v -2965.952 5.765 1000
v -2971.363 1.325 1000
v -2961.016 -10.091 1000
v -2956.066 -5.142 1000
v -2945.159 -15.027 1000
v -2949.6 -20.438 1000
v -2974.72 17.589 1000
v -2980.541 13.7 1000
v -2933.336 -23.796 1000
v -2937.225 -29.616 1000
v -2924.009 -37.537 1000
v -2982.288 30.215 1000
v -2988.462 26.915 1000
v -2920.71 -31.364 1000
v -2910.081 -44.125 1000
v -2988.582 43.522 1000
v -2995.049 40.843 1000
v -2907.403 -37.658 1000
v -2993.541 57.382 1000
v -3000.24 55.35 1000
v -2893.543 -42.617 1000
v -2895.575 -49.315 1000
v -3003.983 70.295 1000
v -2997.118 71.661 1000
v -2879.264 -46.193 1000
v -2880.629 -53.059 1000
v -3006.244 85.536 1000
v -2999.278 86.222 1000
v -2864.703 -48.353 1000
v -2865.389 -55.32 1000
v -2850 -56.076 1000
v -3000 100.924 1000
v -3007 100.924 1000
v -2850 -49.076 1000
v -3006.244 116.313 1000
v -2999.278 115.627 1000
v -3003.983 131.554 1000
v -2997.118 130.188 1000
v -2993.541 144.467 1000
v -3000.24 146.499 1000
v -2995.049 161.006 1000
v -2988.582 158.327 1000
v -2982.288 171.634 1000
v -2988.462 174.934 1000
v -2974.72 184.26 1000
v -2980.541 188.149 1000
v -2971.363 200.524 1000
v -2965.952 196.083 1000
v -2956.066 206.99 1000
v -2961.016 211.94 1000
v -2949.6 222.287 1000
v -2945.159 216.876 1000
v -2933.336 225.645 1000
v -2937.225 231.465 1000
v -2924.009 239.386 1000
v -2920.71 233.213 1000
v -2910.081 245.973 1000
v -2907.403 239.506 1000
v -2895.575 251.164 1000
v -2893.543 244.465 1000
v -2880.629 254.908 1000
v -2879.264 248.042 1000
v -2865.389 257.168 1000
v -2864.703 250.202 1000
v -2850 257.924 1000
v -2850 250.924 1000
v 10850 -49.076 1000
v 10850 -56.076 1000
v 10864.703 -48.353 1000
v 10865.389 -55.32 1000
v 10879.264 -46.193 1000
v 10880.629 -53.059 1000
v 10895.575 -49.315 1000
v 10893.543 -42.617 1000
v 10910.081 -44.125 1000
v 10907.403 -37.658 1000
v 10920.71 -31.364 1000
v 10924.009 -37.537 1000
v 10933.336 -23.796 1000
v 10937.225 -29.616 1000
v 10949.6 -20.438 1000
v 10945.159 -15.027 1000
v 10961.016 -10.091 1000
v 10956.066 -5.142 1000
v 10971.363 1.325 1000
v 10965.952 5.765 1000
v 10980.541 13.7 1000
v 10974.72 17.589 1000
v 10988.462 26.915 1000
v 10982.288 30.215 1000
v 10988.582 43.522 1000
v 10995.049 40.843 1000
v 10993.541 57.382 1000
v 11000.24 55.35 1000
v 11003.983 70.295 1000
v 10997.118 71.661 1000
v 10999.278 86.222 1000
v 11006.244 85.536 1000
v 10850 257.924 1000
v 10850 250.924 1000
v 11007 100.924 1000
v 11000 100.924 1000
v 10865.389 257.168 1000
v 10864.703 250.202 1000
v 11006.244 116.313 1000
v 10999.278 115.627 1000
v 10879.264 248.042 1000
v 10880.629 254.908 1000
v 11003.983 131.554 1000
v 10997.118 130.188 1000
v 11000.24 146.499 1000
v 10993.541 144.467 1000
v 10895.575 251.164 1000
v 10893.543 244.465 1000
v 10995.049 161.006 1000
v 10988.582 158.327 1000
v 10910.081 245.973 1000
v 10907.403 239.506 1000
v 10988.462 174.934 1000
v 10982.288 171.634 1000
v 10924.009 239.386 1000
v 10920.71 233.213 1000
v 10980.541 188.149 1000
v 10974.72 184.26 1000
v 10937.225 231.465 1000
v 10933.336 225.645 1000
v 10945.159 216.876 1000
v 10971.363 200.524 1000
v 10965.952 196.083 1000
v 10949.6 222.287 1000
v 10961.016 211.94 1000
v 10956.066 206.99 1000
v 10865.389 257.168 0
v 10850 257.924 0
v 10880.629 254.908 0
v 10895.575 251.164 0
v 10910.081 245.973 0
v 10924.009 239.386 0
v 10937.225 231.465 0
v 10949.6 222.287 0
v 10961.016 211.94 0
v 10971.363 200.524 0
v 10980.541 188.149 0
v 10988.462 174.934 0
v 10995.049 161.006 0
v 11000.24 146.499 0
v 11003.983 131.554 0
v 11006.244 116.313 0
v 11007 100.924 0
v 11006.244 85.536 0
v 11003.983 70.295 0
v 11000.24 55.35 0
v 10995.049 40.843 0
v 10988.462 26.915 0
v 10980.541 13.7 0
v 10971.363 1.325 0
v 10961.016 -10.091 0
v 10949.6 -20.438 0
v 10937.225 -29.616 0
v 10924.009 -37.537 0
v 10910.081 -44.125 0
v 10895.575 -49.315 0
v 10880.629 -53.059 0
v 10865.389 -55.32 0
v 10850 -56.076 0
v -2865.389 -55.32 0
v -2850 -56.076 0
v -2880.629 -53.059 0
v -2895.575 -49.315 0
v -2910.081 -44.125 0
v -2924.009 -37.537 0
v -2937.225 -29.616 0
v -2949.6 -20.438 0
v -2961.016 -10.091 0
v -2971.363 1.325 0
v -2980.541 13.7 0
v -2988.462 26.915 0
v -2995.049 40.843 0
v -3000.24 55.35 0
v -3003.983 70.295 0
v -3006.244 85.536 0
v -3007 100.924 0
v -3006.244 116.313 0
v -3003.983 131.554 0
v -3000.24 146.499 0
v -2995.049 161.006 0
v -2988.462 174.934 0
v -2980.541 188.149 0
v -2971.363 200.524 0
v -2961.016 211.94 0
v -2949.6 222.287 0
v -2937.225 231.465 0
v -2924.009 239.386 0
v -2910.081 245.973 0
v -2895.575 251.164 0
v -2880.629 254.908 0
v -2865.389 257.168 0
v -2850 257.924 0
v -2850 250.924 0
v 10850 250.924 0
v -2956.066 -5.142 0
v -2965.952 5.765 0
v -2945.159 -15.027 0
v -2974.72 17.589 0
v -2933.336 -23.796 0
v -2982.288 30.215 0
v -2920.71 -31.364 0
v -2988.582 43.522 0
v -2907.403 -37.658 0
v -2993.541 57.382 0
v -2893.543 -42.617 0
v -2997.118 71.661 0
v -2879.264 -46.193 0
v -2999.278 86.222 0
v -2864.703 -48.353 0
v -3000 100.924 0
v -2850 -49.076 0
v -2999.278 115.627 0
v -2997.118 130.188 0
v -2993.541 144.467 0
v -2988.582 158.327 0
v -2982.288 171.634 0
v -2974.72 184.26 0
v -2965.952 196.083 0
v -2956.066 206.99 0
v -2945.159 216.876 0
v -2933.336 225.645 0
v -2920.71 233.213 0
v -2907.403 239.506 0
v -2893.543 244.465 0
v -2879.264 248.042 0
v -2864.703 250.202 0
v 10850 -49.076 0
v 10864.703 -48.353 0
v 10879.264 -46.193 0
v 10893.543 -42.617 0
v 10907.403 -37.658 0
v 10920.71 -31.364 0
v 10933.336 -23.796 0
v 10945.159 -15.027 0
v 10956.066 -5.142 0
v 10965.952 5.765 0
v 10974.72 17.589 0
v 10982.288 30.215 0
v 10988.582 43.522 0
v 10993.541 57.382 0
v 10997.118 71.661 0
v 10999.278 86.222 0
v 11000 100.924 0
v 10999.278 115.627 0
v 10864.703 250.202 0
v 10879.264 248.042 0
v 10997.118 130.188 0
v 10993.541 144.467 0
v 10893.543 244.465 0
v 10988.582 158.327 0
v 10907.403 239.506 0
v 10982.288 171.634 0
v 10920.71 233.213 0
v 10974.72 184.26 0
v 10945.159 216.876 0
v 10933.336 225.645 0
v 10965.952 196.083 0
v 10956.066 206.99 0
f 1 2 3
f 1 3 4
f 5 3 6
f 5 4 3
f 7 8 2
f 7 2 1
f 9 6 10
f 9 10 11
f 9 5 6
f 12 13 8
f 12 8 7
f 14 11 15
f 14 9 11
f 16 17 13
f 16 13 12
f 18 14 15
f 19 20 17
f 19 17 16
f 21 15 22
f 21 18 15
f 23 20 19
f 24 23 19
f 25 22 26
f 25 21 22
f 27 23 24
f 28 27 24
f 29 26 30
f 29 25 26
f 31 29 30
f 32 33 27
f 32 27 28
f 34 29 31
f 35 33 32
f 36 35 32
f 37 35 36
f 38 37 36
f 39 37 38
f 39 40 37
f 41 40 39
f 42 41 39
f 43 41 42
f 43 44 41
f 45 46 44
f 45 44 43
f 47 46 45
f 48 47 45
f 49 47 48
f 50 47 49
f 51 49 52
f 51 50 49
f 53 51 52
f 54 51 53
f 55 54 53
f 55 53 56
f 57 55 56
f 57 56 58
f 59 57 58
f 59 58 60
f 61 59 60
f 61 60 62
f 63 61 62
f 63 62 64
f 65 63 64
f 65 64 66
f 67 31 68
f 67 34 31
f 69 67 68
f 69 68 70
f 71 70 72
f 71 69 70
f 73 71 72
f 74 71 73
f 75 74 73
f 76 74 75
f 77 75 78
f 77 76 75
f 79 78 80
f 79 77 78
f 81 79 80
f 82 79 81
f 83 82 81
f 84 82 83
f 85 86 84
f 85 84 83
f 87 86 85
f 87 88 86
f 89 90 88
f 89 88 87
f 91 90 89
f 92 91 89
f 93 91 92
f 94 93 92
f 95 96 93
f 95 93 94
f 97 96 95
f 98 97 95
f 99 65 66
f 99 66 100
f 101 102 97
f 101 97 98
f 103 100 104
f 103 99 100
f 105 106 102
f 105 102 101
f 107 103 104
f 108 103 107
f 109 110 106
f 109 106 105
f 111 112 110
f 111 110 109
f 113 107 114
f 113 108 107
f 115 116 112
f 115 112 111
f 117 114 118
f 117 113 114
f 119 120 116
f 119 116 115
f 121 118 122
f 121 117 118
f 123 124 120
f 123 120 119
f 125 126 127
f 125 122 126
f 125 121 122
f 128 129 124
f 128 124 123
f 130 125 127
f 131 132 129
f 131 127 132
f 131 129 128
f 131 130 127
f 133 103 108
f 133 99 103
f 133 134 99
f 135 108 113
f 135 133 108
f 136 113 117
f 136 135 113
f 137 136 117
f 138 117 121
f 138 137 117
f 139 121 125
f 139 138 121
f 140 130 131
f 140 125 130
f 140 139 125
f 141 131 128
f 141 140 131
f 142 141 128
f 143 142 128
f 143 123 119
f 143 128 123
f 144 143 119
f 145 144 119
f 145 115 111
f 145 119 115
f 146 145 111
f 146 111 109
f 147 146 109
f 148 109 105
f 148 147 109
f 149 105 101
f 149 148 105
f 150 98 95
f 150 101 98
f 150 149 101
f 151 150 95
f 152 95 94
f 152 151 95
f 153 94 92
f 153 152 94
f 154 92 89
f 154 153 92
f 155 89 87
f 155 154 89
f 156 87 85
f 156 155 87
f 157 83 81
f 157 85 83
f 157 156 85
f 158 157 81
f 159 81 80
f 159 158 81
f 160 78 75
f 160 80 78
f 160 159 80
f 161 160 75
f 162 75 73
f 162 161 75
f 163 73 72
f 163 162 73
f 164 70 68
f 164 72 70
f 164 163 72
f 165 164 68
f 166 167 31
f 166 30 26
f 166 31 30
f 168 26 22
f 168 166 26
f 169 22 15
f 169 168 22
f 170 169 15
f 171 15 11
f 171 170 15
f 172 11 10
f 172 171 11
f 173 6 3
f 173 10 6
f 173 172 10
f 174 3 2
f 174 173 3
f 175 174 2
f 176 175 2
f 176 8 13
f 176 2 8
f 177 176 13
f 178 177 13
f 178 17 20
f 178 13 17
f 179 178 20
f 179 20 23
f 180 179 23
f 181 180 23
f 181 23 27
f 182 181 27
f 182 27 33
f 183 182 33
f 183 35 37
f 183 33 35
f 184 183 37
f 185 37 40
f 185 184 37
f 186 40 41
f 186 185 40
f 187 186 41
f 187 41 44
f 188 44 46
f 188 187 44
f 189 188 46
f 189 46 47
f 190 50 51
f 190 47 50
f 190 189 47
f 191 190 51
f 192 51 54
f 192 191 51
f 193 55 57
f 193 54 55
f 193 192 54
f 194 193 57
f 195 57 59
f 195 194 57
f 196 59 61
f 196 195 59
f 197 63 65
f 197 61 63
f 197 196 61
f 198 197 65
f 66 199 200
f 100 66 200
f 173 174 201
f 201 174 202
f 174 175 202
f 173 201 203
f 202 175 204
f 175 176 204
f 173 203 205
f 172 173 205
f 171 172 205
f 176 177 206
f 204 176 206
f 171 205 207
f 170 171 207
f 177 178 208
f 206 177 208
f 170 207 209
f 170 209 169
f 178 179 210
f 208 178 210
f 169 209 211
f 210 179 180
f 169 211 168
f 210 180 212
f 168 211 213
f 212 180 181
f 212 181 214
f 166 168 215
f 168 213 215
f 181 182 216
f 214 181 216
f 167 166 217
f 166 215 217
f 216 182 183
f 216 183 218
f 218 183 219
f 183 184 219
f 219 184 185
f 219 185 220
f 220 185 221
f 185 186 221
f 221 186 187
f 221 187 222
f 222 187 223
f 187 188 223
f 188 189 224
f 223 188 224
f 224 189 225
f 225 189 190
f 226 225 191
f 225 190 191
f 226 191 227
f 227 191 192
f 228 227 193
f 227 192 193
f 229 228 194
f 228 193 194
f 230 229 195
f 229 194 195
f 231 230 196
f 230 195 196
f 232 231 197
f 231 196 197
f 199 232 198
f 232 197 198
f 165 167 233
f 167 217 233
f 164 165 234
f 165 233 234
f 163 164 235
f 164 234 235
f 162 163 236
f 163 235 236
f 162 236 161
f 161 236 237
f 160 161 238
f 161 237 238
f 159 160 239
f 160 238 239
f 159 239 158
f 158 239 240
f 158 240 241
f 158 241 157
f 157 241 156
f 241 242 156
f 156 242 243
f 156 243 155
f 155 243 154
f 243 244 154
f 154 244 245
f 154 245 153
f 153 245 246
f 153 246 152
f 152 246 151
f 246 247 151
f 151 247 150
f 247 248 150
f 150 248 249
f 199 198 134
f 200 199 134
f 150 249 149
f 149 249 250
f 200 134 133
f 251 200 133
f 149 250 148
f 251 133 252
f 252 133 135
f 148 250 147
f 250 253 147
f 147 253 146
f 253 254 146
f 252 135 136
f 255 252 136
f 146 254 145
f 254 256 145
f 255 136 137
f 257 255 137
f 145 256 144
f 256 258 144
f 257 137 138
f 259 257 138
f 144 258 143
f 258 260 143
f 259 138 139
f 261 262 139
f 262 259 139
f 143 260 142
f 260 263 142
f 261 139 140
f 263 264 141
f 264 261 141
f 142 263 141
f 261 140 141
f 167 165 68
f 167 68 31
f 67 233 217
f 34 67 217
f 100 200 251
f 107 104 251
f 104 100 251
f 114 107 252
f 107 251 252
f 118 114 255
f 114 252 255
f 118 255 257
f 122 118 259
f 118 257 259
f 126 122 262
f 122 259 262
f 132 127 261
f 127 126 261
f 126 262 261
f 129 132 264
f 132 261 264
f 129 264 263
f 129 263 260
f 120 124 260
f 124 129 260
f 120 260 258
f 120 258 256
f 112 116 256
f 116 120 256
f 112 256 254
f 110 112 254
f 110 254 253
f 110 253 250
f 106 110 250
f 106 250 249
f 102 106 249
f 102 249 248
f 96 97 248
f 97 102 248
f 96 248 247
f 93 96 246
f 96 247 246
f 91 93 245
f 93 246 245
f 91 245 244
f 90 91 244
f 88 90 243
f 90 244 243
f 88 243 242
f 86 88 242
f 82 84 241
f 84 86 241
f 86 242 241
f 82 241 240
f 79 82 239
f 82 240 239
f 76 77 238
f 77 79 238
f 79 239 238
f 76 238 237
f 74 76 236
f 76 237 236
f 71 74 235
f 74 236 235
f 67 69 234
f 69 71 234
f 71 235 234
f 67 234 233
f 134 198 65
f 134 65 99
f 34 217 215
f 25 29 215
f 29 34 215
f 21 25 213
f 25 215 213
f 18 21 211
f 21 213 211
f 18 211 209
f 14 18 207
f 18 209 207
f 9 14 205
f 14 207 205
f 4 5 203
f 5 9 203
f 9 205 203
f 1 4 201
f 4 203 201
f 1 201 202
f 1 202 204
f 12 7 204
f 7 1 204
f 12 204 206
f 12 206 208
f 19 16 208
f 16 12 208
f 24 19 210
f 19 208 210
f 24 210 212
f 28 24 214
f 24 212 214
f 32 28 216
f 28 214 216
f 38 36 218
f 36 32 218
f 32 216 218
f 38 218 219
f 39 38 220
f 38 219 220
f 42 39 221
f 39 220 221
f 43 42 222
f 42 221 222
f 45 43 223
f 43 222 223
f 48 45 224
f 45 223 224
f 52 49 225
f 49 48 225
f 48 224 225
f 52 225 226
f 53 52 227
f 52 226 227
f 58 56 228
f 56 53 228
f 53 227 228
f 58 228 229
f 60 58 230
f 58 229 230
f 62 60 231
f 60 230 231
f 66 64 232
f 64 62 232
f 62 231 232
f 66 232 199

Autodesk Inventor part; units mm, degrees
ref_plane "YZ Plane" through (0, 0, 0) normal (1, 0, 0) x (0, 1, 0)
ref_plane "XZ Plane" through (0, 0, 0) normal (0, 1, 0) x (-1, 0, 0)
ref_plane "XY Plane" through (0, 0, 0) normal (0, 0, 1) x (1, 0, 0)
sketch "Boceto1" plane through (0, 0, 0) normal (0, 0, 1) x (1, 0, 0)
  line L0 (-2850, 250.9244) -> (10850, 250.9244)
  line L1 (10850, 250.9244) -> (10850, -49.0756) construction
  line L2 (10850, -49.0756) -> (-2850, -49.0756)
  line L3 (-2850, -49.0756) -> (-2850, 250.9244) construction
  line L4 (-2850, 250.9244) -> (10850, -49.0756) construction
  line L5 (10850, 250.9244) -> (-2850, -49.0756) construction
  arc A0 (10850, -49.0756) -> (10850, 250.9244) centre (10850, 100.9244) ccw
  arc A1 (-2850, 250.9244) -> (-2850, -49.0756) centre (-2850, 100.9244) ccw
  arc A2 (10850, -56.0756) -> (10850, 257.9244) centre (10850, 100.9244) ccw
  line L6 (10850, -56.0756) -> (-2850, -56.0756)
  arc A3 (-2850, 257.9244) -> (-2850, -56.0756) centre (-2850, 100.9244) ccw
  line L7 (-2850, 257.9244) -> (10850, 257.9244)
  point P0 (-650, 3378.1666)
  point P1 (4000, 100.9244)
  dimension "d11" = 13700
  dimension "d12" = 7
  dimension "d13" = 300
extrude "Extrusión1" add sketch "Boceto1" along normal blind 1000
equation "\"L\" = 14000"
properties part number "BandaLona"
